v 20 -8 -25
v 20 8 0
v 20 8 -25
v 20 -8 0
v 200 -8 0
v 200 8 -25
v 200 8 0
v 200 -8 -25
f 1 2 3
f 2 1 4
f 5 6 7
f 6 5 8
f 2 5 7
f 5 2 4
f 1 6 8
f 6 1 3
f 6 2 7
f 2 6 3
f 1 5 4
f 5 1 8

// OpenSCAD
// file: ../hdim.scad
module hdim(
  x1 = 10, 
  x2 = 200, 
  y = 10, 
  dimline_lenght = 9.0,
  scaling = 1.0) 
{
    dimline_overlap = scaling * 0.5;
    dimline_width = scaling * 0.6;
    text_size = scaling * 4;
    tmp = 2*dimline_overlap+text_size/2;
    scaled_dl_len = scaling * dimline_lenght;
    text_pos = scaled_dl_len>0 ? tmp : -tmp; 
    dimline_abs = scaled_dl_len>0 ? scaled_dl_len : -scaled_dl_len;
    
    color([146/255, 154/255, 255/255, 0.7])
    {
        translate([x1,y-scaled_dl_len/2,0]) 
            cube([dimline_width, 
                dimline_abs + 2*dimline_overlap,
                dimline_width/2], 
                center=true);
                
        translate([x2,y-scaled_dl_len/2,0]) 
            cube([dimline_width, 
                dimline_abs + 2*dimline_overlap,
                dimline_width/2], 
                center=true);

        translate([(x1+x2)/2,y-scaled_dl_len,0]) 
            cube([x2-x1, 
                dimline_width,
                dimline_width/2], 
                center=true);
    }
        
    translate([(x1+x2)/2,y-scaled_dl_len-text_pos,0]) 
    {
        color([106/255, 134/255, 245/255])
        cube([text_size * 5, 1.2*text_size, 0.8*scaling], center=true);
        
        color([1,1,1,1])
        {
            translate([0,0,0.4*scaling])
            linear_extrude(0.2*scaling)
            text(str(0.1*round((x2-x1)*10)), size = text_size, 
                halign = "center",valign = "center");
            translate([0,0,-0.4*scaling])
            rotate([0,180,0])
            linear_extrude(0.2*scaling)
            text(str(0.1*round((x2-x1)*10)), size = text_size, 
                halign = "center",valign = "center");
        }
    }
}

hdim();
// file: reinforcement.scad
use <../hdim.scad>

pillar_corner_rebar_d = 1.2;
pillar_loop_rebar_d = 0.8;

module reinforement_bar(length=100,diam=1,c = "Red") 
{
    color(c) {
      cylinder(h=length, d=diam, center=true, $fn=20);
    }
}

module pillar_reinforement_loop(diam1=10,diam2=20,c = "Red") 
{
  corner_rebarb_d = pillar_corner_rebar_d;
  loop_rebarb_d = pillar_loop_rebar_d;
  dx = (diam1+loop_rebarb_d)/2;
  lx = diam1 + 2*loop_rebarb_d;
  dy = (diam2+loop_rebarb_d)/2;
  ly = diam2 + 2*loop_rebarb_d;
  
  translate([dx,0,0]) 
  rotate([90,0, 0])
  reinforement_bar(ly, loop_rebarb_d, c);

  translate([0,dy,0]) 
  rotate([90,0, 90])
  reinforement_bar(lx, loop_rebarb_d, c);
    
  translate([-dx,0,0]) 
  rotate([90,0, 0])
  reinforement_bar(ly, loop_rebarb_d, c);

  translate([0,-dy,0]) 
  rotate([90,0, 90])
  reinforement_bar(lx, loop_rebarb_d, c);
}

module pillar_welded_lock(diam1=10,diam2=20,c = "Red") 
{
  rebarb_d = pillar_corner_rebar_d;
  dx = diam1/2;
  lx = diam1 - rebarb_d;
  dy = diam2/2;
  adx = lx*sqrt(2);
  ly = diam2 - rebarb_d;
  ady = ly*sqrt(2);
  
  translate([dx,0,0]) 
  rotate([90,0, 0])
  reinforement_bar(ly, rebarb_d, c);

  translate([0,dy,0]) 
  rotate([90,0, 90])
  reinforement_bar(lx, rebarb_d, c);
    
  translate([-dx,0,0]) 
  rotate([90,0, 0])
  reinforement_bar(ly, rebarb_d, c);

  translate([0,-dy,0]) 
  rotate([90,0, 90])
  reinforement_bar(lx, rebarb_d, c);

  translate([dx,0,ly/2+rebarb_d/2]) 
  rotate([45, 0, 0])
  reinforement_bar(ady, rebarb_d, c);

  translate([0,dy,lx/2+rebarb_d/2]) 
  rotate([45, 0, 90])
  reinforement_bar(adx, rebarb_d, c);

  translate([-dx,0,ly/2+rebarb_d/2]) 
  rotate([-45, 0, 0])
  reinforement_bar(ady, rebarb_d, c);

  translate([0,-dy,lx/2+rebarb_d/2]) 
  rotate([-45, 0, 90])
  reinforement_bar(adx, rebarb_d, c);
}

module pillar_reinforement(length=130, diam1=10, diam2=20, n_loops=6, c = "Red") 
{
  dx = diam1/2;
  dy = diam2/2;
  corner_rebar_d = pillar_corner_rebar_d;
  loop_rebarb_d = pillar_loop_rebar_d;
  
  translate([dx,dy,0]) 
  reinforement_bar(length, corner_rebar_d, c);
  translate([dx,-dy,0]) 
  reinforement_bar(length, corner_rebar_d, c);
  translate([-dx,dy,0]) 
  reinforement_bar(length, corner_rebar_d, c);
  translate([-dx,-dy,0]) 
  reinforement_bar(length, corner_rebar_d, c);
  
  l = length-2*loop_rebarb_d;
  step = l/(n_loops-1);
  for (i=[0:n_loops-1]) {
    x = -l/2 + i*step;
    
    translate([0,0,x])
    pillar_reinforement_loop(diam1+corner_rebar_d, diam2+corner_rebar_d, "Orange");
  }

  // Welded locks
  pillar_welded_lock(diam1,diam2,c);
  weld_end_d  = 10;
  translate([0,0,-length/2 + weld_end_d])
  pillar_welded_lock(diam1,diam2,c);
  translate([0,0,length/2 - weld_end_d])
  rotate([180,0,0])
  pillar_welded_lock(diam1,diam2,c);
}


pillar_reinforement();
// main file
use <reinforcement.scad>
use <../hdim.scad>

reinforcement_indent = 2;
reinforcement_step = 18;

module horizontalpillar(x1=20, x2=200, w=16, h=25, show_concrete=true) 
{
  l = x2 - x1;
  n_reinforcement_loops = round(l/reinforcement_step+1);
  translate([x1+(x2-x1)/2,0,-h/2])
  {
    rotate([0,90,0])
    pillar_reinforement(l, h-2*reinforcement_indent, w-2*reinforcement_indent, n_reinforcement_loops); 

    if (show_concrete) {
      color([0.5,1,1,0.3])
      cube ([l, w, h], center=true); 
    }
  }
}


horizontalpillar();
